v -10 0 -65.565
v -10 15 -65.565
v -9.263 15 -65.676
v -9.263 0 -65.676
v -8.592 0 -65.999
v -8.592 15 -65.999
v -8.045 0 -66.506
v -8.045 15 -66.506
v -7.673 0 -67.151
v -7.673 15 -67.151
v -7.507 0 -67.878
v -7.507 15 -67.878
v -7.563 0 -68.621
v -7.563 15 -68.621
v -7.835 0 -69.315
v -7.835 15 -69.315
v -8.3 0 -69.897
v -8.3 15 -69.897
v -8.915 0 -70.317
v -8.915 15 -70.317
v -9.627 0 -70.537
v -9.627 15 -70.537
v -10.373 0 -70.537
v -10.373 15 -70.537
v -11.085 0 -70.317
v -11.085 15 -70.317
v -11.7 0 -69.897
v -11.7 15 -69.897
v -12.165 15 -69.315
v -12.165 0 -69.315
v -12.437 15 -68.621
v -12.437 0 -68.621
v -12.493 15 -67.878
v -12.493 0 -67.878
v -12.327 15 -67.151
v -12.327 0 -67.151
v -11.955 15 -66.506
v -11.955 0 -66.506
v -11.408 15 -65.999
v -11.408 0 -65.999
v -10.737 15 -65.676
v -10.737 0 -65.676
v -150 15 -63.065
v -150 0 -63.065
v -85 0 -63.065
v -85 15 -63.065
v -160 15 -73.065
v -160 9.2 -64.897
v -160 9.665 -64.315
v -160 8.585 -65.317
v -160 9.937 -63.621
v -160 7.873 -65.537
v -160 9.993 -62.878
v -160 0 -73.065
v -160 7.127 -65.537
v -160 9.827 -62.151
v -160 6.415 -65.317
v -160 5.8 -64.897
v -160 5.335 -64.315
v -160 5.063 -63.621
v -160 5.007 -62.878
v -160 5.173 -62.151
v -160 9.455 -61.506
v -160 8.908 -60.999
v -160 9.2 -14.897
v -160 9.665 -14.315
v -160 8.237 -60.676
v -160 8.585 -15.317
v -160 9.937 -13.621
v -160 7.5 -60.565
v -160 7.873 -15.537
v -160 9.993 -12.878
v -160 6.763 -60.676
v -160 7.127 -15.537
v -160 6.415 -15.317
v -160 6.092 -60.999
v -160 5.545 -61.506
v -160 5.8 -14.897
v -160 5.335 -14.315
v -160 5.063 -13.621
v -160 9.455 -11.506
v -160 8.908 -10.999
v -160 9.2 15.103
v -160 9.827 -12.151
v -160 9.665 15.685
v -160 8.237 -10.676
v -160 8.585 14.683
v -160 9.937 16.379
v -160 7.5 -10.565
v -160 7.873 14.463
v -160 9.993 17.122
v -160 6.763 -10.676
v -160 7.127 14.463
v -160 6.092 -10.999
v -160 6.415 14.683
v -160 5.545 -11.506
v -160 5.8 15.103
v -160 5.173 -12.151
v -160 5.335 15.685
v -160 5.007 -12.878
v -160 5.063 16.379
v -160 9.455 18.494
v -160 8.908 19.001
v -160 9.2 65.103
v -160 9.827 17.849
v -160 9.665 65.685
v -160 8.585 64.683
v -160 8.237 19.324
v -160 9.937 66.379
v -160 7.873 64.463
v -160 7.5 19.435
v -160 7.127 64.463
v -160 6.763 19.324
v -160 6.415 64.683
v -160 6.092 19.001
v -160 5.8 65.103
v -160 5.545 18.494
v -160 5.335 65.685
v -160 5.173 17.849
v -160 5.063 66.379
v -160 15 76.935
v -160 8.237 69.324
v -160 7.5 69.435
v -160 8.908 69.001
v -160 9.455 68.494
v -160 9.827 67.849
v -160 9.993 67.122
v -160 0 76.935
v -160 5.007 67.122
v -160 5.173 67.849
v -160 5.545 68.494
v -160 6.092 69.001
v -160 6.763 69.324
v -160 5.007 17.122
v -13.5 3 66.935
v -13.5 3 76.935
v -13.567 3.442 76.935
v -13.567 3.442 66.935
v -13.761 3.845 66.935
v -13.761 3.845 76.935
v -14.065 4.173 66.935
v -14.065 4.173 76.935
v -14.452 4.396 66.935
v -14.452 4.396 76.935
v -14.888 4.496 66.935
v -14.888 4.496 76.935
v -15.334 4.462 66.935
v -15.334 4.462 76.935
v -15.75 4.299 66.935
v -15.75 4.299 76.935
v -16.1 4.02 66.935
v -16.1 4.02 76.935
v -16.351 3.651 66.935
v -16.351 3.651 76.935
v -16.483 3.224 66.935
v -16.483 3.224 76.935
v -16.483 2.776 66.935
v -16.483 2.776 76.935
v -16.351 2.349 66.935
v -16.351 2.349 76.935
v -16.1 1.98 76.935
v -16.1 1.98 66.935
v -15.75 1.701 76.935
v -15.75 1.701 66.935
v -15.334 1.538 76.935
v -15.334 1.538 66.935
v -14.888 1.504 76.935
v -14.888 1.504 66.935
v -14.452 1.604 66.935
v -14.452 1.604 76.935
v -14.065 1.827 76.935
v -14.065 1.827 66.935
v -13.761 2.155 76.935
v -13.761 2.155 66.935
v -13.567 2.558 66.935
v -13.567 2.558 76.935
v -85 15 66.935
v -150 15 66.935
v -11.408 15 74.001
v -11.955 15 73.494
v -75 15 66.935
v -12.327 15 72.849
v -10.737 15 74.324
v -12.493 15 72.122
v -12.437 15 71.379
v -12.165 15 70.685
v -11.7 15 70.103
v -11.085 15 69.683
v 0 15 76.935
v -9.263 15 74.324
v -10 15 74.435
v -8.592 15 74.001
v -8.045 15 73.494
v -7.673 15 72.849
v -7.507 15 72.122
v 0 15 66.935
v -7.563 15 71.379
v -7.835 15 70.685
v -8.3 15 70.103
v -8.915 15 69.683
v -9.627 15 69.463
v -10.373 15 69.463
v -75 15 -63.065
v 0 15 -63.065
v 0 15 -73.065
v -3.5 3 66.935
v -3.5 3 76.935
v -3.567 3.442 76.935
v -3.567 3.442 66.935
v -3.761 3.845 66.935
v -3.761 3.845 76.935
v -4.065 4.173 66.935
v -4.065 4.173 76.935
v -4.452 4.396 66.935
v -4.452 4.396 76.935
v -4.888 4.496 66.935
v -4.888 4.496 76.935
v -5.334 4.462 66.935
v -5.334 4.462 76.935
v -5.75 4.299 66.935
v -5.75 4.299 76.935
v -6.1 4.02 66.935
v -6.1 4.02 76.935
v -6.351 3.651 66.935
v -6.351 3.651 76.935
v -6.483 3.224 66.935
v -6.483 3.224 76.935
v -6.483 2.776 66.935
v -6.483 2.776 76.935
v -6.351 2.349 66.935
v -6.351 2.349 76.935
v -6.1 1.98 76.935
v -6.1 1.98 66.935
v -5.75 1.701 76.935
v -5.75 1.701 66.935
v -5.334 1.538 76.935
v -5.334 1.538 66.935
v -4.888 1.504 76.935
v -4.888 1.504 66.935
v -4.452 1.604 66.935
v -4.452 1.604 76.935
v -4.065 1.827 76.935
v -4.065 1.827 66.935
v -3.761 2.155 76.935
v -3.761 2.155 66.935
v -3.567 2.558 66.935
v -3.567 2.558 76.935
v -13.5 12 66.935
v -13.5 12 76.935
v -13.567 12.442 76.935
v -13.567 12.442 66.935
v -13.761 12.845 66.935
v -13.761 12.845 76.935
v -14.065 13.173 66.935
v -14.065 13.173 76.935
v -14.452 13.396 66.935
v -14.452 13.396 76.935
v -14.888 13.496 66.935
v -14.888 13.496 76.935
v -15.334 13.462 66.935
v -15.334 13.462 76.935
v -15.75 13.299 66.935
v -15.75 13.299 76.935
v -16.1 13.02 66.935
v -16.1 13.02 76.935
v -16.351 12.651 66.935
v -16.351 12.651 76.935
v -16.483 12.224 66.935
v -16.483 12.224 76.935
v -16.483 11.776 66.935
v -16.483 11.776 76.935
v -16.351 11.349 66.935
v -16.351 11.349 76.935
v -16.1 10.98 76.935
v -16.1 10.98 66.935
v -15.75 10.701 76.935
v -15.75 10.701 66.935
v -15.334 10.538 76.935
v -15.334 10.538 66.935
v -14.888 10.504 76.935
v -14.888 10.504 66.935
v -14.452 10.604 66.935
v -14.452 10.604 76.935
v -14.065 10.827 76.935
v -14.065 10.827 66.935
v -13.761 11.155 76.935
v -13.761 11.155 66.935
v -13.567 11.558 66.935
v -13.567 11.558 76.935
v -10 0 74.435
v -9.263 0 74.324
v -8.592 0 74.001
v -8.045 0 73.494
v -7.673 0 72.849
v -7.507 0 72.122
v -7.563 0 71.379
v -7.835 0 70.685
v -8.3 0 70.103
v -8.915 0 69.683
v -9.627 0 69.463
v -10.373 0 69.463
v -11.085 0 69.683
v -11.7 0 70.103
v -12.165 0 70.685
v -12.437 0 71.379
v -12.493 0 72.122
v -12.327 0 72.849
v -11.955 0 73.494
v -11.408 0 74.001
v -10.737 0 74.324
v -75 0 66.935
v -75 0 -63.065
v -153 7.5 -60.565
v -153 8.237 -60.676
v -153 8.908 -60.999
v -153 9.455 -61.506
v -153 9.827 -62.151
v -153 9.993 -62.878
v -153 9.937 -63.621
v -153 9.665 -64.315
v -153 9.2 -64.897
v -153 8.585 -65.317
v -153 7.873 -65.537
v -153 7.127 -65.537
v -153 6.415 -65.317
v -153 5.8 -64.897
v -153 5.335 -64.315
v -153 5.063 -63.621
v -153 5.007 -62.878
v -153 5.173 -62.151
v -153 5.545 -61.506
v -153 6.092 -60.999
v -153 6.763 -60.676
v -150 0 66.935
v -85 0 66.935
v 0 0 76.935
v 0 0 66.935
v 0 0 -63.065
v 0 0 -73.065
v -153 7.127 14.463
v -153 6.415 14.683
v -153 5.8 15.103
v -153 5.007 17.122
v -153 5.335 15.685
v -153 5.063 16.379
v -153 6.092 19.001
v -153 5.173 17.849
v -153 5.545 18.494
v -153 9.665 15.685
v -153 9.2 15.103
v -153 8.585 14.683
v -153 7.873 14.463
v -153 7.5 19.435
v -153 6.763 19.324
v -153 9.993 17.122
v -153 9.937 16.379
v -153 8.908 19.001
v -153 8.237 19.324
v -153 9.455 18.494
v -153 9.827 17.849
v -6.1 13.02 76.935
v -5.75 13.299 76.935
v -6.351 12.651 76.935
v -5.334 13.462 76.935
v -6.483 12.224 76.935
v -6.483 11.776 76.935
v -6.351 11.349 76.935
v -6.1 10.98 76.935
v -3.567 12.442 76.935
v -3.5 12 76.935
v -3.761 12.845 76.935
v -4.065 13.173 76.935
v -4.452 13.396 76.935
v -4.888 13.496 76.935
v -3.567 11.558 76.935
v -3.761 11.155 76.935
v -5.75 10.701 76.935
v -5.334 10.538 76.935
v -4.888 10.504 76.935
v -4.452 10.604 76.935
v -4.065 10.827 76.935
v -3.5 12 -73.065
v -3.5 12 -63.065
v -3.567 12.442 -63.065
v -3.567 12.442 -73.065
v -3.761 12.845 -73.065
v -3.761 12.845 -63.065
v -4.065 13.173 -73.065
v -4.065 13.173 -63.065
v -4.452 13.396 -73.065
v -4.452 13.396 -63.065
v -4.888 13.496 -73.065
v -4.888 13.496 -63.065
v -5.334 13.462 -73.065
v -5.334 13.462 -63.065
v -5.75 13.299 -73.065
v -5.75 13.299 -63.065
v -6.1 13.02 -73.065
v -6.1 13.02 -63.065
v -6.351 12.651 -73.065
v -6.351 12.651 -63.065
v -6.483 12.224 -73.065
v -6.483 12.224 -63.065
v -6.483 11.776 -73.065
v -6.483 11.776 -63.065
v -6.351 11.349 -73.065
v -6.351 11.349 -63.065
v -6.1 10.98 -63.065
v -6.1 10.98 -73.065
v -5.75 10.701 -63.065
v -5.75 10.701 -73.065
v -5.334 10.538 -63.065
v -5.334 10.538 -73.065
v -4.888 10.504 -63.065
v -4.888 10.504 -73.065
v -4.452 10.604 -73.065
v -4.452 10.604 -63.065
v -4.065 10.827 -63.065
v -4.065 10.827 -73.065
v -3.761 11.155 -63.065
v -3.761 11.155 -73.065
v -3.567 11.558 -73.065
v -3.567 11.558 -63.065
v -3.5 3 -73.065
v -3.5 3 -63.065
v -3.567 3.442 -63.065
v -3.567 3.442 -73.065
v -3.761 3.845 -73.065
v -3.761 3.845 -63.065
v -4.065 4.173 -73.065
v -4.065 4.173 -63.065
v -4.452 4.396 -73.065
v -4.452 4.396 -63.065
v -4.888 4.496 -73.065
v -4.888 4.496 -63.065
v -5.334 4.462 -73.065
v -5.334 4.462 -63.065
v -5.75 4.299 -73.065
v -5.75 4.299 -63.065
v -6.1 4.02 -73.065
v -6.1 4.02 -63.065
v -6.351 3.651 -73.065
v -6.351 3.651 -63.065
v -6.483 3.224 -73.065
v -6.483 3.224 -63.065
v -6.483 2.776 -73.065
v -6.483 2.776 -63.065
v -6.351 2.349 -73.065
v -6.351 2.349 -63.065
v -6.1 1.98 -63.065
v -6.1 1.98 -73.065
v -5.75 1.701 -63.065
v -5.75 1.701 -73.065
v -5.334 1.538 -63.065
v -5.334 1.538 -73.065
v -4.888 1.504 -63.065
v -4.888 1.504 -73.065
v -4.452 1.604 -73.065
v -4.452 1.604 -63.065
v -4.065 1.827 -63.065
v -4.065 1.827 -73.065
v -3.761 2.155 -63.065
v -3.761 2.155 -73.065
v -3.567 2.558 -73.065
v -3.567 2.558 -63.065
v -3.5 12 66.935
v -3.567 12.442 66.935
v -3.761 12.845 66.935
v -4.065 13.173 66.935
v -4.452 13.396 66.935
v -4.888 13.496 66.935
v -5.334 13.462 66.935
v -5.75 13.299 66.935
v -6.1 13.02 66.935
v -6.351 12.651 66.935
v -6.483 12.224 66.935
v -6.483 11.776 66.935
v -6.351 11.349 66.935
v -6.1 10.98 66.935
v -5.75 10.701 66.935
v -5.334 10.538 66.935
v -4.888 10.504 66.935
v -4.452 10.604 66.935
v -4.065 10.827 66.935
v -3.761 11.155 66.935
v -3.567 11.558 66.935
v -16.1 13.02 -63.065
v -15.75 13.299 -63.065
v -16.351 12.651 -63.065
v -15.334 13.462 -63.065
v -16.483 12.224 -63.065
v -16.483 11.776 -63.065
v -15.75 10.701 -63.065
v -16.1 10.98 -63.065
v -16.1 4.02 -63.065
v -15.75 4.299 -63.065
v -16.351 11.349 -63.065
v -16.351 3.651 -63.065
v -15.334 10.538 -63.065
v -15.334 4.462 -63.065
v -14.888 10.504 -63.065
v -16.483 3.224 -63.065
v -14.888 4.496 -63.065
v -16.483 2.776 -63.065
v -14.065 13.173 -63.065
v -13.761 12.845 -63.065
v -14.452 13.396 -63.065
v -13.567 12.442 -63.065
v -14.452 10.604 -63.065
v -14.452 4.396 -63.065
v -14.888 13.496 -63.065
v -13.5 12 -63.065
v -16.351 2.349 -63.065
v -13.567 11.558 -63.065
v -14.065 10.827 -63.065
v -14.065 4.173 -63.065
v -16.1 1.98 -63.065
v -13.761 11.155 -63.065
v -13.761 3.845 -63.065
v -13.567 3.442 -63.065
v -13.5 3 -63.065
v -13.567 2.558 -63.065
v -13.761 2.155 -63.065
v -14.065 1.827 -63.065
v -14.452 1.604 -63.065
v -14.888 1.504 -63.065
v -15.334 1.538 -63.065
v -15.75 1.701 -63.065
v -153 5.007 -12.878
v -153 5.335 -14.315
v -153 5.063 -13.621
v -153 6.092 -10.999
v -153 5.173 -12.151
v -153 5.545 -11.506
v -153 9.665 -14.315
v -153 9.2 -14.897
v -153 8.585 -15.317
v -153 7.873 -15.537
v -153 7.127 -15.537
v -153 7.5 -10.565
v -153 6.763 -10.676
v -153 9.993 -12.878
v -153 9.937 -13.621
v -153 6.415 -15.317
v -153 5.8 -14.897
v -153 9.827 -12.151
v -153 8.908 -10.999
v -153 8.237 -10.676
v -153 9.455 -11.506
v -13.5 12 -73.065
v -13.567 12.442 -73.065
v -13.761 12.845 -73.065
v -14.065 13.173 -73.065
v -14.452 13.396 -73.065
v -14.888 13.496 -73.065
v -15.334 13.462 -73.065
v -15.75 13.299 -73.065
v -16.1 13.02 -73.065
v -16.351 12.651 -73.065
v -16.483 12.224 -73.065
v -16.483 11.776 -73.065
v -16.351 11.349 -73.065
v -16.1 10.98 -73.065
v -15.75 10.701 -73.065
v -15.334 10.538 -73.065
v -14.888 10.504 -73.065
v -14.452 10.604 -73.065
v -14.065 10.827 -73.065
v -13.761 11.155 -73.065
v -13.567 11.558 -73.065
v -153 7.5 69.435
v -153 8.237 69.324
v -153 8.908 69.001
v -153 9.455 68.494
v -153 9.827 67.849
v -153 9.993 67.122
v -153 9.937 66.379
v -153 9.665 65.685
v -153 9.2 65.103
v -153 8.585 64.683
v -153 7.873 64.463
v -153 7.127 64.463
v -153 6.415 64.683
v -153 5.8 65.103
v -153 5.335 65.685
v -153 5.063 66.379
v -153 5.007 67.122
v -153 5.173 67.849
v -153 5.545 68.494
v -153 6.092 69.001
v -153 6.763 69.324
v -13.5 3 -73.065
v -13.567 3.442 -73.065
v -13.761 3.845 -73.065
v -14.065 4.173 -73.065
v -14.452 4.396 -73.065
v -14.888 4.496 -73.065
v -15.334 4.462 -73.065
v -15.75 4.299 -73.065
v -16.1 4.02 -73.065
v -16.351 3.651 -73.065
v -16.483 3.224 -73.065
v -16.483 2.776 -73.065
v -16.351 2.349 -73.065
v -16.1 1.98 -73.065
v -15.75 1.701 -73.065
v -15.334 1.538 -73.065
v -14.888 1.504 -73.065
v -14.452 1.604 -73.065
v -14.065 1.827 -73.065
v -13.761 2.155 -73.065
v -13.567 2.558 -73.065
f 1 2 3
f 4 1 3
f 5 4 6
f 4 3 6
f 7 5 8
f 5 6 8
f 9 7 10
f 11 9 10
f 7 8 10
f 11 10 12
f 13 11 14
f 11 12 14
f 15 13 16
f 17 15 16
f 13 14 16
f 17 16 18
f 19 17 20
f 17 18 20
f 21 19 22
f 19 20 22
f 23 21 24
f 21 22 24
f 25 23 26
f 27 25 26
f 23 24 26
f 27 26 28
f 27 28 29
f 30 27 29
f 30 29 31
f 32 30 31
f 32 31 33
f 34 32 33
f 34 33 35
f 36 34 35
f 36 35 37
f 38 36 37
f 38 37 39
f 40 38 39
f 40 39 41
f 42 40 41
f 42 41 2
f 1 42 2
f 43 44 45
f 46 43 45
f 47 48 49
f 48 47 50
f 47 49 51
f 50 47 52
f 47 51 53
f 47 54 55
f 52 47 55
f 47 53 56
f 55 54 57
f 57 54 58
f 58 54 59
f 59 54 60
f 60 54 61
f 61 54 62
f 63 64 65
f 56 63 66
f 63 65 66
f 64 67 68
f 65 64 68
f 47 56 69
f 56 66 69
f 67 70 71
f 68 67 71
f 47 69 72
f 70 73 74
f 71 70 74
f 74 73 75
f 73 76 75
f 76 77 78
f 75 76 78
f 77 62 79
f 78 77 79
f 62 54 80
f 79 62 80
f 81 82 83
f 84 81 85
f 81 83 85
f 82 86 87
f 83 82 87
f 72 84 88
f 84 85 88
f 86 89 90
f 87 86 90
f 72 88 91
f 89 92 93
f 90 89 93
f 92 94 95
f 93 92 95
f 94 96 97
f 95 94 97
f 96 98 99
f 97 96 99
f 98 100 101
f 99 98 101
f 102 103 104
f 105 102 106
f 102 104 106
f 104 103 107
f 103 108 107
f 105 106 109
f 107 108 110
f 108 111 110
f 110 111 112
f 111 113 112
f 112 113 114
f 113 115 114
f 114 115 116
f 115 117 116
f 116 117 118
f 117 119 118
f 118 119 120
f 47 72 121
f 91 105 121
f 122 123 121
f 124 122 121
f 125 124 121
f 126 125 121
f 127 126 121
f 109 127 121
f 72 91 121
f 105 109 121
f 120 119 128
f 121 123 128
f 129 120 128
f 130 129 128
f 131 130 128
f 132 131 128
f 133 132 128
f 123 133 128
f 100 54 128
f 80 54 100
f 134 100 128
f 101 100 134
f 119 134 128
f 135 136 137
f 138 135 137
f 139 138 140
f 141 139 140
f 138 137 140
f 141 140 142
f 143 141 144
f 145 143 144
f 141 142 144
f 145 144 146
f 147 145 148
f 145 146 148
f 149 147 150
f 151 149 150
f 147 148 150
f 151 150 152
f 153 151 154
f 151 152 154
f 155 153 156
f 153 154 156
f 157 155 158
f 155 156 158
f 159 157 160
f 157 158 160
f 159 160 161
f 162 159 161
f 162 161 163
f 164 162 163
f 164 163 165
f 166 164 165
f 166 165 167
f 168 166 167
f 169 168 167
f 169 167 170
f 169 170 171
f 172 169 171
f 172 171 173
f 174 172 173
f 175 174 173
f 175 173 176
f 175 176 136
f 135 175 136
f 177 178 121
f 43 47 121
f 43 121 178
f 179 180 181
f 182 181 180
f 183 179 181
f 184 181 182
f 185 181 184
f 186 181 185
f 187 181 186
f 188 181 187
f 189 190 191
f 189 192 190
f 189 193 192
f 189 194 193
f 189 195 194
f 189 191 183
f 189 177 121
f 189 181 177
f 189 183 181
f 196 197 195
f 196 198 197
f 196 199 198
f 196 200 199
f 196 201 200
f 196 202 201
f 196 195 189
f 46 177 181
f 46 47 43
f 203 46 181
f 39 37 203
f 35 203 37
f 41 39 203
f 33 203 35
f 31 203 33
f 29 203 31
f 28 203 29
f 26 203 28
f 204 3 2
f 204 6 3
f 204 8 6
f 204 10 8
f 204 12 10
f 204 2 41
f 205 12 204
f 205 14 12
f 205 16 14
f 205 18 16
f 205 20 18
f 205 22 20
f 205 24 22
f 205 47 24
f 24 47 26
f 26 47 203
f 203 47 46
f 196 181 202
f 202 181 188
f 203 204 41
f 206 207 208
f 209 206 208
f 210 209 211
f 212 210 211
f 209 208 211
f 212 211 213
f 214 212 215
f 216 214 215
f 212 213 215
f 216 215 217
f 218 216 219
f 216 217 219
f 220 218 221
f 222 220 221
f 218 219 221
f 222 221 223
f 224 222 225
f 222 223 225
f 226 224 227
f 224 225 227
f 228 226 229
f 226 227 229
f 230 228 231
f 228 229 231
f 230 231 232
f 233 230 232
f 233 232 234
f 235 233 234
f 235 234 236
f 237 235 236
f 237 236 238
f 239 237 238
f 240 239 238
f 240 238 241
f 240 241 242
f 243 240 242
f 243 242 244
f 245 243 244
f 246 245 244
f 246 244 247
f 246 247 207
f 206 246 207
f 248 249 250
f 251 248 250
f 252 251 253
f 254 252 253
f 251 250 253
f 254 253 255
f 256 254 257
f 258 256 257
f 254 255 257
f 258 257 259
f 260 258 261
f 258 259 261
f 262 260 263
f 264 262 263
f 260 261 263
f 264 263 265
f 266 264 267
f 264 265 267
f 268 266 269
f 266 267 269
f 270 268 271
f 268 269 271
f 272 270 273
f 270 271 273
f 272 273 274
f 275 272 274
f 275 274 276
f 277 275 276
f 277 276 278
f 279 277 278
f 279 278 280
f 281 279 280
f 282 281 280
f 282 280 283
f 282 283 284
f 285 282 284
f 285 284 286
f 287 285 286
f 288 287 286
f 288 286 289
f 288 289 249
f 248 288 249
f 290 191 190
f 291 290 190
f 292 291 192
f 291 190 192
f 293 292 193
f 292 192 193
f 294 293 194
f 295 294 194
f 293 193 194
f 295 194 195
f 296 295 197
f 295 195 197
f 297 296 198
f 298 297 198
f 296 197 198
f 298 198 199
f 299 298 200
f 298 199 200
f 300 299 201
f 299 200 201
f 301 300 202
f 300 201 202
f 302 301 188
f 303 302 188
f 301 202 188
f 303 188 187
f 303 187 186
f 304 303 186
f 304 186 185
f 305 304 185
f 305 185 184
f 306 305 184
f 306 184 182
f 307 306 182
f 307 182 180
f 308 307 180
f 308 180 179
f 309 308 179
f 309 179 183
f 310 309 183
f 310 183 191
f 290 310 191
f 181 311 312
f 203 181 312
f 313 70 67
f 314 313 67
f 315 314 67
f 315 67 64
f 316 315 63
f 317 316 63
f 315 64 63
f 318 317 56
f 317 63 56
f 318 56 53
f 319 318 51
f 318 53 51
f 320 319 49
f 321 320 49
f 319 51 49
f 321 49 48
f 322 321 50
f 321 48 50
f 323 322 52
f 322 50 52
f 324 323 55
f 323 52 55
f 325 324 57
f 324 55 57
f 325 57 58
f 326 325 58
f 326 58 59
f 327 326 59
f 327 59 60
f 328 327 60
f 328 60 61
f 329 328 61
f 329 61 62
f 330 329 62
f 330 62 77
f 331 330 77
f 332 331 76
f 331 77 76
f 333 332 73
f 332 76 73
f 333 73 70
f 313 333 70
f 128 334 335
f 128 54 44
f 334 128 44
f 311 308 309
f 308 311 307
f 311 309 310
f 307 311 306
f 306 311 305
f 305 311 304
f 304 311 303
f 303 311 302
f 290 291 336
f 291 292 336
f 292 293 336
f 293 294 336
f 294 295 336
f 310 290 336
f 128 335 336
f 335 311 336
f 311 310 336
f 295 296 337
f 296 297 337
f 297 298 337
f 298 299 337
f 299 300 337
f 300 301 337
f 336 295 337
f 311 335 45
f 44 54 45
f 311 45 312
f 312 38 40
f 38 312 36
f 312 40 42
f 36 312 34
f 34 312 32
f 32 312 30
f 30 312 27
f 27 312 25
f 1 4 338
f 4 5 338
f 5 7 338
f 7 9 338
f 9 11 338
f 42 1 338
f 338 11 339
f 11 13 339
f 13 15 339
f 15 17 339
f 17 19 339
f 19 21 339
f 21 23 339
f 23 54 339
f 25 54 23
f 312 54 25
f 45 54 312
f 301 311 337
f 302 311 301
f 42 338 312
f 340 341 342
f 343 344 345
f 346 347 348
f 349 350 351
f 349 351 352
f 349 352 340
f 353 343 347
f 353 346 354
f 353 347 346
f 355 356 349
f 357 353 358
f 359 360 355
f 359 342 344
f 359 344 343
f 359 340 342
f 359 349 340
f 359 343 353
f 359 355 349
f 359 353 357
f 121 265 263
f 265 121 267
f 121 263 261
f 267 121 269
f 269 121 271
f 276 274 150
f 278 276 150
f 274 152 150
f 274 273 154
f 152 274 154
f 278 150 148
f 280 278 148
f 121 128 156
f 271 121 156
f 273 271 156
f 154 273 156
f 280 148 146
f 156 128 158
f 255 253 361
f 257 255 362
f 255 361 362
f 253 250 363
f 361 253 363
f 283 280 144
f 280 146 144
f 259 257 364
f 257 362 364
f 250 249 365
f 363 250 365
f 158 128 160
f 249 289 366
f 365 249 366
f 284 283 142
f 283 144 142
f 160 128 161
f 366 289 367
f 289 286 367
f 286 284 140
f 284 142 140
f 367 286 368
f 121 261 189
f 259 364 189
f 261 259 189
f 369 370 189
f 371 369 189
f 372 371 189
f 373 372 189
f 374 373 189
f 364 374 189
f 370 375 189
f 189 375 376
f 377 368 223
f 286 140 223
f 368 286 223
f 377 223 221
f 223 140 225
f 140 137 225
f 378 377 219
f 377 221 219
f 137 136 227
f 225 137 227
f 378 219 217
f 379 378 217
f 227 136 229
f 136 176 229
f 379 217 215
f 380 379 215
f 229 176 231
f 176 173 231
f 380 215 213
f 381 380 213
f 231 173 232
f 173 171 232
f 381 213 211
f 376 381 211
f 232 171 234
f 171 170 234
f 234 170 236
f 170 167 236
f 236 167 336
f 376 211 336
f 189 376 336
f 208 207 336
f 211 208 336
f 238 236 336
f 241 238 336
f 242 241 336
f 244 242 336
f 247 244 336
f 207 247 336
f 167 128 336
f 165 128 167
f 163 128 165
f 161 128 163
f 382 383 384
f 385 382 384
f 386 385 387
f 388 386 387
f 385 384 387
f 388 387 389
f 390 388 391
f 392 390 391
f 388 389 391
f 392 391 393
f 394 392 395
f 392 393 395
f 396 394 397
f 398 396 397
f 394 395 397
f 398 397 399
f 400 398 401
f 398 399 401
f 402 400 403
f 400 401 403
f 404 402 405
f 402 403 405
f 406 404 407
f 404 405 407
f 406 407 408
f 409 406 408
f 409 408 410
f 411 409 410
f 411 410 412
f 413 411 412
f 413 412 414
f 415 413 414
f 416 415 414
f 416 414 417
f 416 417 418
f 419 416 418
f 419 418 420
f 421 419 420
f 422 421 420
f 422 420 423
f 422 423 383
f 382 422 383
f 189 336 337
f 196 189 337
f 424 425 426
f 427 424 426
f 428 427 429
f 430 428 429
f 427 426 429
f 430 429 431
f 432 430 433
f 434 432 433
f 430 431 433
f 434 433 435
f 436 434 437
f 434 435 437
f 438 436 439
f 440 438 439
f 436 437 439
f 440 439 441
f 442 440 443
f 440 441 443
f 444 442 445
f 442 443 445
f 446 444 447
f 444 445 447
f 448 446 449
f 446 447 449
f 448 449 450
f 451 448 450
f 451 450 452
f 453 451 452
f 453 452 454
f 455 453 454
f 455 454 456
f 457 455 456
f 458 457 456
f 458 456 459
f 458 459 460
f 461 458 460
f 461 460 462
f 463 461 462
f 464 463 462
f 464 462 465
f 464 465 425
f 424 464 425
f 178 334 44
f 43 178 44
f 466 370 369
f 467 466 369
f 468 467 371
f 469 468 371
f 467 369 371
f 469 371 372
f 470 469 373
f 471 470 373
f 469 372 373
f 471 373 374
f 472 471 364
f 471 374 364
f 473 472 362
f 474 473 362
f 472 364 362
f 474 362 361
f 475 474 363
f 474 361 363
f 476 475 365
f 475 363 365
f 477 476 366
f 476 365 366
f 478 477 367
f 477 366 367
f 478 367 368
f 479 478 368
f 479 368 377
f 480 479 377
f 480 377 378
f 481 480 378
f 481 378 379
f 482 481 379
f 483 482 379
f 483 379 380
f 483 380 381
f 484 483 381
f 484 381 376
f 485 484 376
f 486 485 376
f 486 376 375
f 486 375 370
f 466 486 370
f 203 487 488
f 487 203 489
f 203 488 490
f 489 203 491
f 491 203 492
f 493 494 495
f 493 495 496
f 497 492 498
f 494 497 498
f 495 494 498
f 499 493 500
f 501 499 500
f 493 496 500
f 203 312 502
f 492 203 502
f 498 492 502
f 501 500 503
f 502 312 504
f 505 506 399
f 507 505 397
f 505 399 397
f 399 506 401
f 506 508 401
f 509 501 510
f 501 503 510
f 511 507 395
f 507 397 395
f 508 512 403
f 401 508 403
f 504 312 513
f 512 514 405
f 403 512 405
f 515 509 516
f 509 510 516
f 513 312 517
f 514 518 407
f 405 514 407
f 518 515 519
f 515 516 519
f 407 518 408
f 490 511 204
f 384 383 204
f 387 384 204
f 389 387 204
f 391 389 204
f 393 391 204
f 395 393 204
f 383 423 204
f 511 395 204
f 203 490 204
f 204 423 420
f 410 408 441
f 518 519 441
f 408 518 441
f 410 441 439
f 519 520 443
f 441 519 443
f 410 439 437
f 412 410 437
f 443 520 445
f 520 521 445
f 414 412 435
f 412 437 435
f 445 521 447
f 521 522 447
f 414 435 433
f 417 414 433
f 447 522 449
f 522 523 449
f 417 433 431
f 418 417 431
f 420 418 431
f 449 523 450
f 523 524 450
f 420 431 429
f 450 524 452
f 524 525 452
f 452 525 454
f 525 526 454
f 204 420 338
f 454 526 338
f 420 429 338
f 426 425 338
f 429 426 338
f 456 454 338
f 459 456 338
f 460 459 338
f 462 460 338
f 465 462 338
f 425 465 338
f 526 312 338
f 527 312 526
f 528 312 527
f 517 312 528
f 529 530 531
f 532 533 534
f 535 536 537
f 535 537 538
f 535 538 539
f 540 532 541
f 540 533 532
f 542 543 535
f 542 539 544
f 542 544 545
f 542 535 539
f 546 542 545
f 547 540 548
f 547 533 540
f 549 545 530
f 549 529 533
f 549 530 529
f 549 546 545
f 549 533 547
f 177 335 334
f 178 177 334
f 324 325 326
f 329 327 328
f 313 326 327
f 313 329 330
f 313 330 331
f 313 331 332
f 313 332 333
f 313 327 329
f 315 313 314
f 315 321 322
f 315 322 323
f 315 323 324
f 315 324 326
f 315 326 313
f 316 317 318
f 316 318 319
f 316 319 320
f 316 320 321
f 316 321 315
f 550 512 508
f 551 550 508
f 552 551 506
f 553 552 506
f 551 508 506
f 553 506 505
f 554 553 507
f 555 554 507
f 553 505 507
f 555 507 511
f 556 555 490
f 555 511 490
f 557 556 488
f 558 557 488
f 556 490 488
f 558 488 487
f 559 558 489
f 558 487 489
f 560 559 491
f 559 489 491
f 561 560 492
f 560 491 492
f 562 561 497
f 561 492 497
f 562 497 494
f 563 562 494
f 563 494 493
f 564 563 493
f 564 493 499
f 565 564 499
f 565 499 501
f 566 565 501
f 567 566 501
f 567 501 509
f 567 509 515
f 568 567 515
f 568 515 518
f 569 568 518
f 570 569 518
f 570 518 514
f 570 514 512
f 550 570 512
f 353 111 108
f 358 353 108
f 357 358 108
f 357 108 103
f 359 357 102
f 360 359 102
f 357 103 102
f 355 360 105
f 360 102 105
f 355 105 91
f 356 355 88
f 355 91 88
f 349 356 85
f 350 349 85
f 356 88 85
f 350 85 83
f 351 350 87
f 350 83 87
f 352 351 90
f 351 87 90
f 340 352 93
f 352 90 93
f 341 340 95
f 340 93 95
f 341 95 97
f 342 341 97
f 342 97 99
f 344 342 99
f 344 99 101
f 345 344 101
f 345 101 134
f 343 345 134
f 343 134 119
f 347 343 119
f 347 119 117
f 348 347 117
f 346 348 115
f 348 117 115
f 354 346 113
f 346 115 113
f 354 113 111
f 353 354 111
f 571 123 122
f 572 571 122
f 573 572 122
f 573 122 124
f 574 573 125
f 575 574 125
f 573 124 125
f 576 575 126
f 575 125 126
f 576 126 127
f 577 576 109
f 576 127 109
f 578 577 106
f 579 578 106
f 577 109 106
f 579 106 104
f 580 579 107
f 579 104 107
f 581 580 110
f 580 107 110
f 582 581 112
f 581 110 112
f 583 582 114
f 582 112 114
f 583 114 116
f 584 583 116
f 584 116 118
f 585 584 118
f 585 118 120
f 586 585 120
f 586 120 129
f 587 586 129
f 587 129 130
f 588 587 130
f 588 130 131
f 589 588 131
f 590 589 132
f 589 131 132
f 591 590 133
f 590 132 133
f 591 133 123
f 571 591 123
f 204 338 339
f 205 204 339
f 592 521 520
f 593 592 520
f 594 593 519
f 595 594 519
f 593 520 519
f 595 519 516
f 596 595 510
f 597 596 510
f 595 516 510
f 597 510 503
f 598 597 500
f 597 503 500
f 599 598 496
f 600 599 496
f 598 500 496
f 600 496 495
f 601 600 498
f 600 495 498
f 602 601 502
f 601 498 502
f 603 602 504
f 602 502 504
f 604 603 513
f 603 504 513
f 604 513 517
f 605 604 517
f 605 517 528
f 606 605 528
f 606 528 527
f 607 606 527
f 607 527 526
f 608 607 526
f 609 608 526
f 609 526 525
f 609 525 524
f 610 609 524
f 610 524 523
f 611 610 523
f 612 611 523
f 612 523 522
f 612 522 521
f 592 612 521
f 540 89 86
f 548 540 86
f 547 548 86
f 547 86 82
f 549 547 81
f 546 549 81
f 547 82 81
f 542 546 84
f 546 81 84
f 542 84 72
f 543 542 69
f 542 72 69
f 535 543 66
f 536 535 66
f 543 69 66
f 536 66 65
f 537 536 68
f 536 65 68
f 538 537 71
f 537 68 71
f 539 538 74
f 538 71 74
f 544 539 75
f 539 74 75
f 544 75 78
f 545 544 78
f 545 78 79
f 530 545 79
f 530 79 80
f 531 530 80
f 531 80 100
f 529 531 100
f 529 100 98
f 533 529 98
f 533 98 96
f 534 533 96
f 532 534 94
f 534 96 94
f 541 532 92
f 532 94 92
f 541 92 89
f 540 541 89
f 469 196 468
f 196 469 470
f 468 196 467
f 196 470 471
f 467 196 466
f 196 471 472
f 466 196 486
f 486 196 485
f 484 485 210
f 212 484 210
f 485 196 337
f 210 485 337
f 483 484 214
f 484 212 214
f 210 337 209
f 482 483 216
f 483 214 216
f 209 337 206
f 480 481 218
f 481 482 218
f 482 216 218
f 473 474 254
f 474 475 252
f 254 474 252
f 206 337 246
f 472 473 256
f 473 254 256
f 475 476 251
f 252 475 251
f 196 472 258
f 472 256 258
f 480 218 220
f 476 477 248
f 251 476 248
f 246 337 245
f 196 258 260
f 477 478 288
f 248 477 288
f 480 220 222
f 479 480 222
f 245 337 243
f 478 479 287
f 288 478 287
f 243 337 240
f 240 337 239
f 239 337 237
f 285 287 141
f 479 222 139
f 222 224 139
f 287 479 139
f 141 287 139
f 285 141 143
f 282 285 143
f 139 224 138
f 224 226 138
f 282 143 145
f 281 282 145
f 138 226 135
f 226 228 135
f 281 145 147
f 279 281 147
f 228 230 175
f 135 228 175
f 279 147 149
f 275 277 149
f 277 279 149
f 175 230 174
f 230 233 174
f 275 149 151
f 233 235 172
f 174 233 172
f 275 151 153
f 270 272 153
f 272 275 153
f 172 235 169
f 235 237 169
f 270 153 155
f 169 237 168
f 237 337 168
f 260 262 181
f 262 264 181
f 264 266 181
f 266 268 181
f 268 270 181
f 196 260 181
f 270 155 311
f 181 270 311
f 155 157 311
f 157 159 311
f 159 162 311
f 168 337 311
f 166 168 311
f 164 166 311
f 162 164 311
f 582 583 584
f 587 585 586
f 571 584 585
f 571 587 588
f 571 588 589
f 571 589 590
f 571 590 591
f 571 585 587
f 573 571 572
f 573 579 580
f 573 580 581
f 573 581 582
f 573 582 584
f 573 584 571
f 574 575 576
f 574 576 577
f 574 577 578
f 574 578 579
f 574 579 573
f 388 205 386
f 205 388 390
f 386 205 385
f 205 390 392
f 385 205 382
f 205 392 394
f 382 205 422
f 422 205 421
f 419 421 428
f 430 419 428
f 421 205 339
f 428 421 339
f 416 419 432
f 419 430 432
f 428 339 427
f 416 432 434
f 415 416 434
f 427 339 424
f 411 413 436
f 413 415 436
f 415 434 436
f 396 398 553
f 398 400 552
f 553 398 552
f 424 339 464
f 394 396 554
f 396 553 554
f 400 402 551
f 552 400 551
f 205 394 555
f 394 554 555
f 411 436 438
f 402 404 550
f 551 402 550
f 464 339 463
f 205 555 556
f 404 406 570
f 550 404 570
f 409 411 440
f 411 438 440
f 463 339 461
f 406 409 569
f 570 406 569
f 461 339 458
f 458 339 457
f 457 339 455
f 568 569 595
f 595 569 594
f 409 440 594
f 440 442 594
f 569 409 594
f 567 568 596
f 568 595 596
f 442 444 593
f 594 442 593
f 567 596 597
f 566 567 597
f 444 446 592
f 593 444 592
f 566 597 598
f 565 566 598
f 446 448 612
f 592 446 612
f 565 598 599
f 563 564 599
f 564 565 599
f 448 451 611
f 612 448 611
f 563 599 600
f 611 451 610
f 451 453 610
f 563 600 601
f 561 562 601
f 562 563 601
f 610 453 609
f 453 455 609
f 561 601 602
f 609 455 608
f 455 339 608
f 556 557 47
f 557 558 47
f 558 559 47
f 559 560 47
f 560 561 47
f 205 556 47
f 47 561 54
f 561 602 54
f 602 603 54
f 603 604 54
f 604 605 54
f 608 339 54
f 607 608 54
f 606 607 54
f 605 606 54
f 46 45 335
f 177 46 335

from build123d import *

# Parameters (mm, degrees)
SKETCH_2_W          = 10
SKETCH_2_H          = 130
EXTRUDE_1_DEPTH     = 15
SKETCH_3_R          = 1.5
CUT_EXTRUDE_1_DEPTH = 220.82947937
SKETCH_4_R          = 2.5
CUT_EXTRUDE_2_DEPTH = 7
SKETCH_5_R          = 2.5
CUT_EXTRUDE_3_DEPTH = 179.168652345


with BuildPart() as part:
    # 草图2 → 凸台-拉伸1 (new body)
    with BuildSketch(Plane(origin=(0, 0, 0), x_dir=(1, 0, 0), z_dir=(0, 1, 0))):
        Polygon((0, 73.064516129), (-85, 73.064516129), (-85, 63.064516129), (-75, 63.064516129), (0, 63.064516129), align=None)
        Polygon((-160, 73.064516129), (-160, 63.064516129), (-150, 63.064516129), (-85, 63.064516129), (-85, 73.064516129), align=None)
        with Locations((-80, -1.935483871)):
            Rectangle(SKETCH_2_W, SKETCH_2_H)
        Polygon((-85, -66.935483871), (-85, -76.935483871), (0, -76.935483871), (0, -66.935483871), (-75, -66.935483871), align=None)
        Polygon((-150, -66.935483871), (-160, -66.935483871), (-160, -76.935483871), (-85, -76.935483871), (-85, -66.935483871), align=None)
        with Locations((-155, -1.935483871)):
            Rectangle(SKETCH_2_W, SKETCH_2_H)
    extrude(amount=EXTRUDE_1_DEPTH)

    # 草图3 → 切除-拉伸1 (cut, through all)
    with BuildSketch(Plane.XY.offset(76.935483871)):
        with Locations((-5, 12)):
            Circle(SKETCH_3_R)
        with Locations((-5, 3)):
            Circle(SKETCH_3_R)
        with Locations((-15, 12)):
            Circle(SKETCH_3_R)
        with Locations((-15, 3)):
            Circle(SKETCH_3_R)
    extrude(amount=-CUT_EXTRUDE_1_DEPTH, mode=Mode.SUBTRACT)

    # 草图4 → 切除-拉伸2 (cut)
    with BuildSketch(Plane.ZY.offset(160)):
        with Locations((-63.064516129, 7.5)):
            Circle(SKETCH_4_R)
        with Locations((-13.064516129, 7.5)):
            Circle(SKETCH_4_R)
        with Locations((16.935483871, 7.5)):
            Circle(SKETCH_4_R)
        with Locations((66.935483871, 7.5)):
            Circle(SKETCH_4_R)
    extrude(amount=-CUT_EXTRUDE_2_DEPTH, mode=Mode.SUBTRACT)

    # 草图5 → 切除-拉伸3 (cut, through all)
    with BuildSketch(Plane(origin=(0, 15, 0), x_dir=(1, 0, 0), z_dir=(0, 1, 0))):
        with Locations(Location((-10, 68.064516129, 0), (0, 0, 270))):
            Circle(SKETCH_5_R)
        with Locations(Location((-10, -71.935483871, 0), (0, 0, 270))):
            Circle(SKETCH_5_R)
    extrude(amount=-CUT_EXTRUDE_3_DEPTH, mode=Mode.SUBTRACT)


solid = part.part
